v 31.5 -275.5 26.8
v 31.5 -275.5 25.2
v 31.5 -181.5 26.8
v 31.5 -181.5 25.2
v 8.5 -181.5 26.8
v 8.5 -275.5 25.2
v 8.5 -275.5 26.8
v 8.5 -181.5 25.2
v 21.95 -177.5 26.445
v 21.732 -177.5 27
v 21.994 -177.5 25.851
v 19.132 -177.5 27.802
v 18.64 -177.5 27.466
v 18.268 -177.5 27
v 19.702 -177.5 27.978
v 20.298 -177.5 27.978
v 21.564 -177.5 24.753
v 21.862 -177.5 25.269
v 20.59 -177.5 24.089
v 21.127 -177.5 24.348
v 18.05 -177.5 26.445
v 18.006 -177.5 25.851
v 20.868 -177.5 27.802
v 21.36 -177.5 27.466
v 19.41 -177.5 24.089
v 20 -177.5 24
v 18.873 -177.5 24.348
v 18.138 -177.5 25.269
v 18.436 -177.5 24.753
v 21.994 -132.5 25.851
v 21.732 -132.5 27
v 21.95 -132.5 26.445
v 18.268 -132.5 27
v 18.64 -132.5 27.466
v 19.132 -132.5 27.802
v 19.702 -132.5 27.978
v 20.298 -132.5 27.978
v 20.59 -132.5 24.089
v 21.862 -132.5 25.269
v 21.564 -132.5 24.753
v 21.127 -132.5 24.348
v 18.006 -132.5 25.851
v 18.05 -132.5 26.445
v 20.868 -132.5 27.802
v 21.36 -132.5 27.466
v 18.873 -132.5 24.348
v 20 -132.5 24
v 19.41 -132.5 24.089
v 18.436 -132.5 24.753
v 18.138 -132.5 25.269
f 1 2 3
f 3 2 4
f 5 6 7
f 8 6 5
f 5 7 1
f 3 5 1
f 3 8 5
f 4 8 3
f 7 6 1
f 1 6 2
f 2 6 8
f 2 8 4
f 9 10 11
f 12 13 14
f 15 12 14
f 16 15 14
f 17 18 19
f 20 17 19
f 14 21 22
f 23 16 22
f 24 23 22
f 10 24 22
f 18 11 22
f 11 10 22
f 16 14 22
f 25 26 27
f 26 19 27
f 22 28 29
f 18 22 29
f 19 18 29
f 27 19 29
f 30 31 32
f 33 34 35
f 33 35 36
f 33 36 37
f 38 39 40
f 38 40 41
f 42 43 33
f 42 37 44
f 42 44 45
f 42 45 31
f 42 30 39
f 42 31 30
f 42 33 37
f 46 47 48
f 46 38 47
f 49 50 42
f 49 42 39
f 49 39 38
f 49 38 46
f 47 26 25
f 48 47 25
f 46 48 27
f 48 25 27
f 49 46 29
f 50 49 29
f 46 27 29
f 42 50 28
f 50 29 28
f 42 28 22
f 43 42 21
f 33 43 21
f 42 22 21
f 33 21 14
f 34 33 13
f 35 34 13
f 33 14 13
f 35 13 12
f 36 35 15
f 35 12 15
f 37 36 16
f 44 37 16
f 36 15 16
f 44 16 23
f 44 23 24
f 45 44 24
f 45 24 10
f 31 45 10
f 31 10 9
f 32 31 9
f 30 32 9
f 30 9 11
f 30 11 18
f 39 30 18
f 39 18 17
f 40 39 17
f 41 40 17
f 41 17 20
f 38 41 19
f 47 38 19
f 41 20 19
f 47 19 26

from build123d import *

# Parameters (mm, degrees)
SKETCH1_W           = 23
SKETCH1_H           = 94
BOSS_EXTRUDE1_DEPTH = 1.6
SKETCH2_R           = 2
BOSS_EXTRUDE2_DEPTH = 45


with BuildPart() as part:
    # Sketch1 → Boss-Extrude1 (new body)
    with BuildSketch(Plane.XY.offset(25.2)):
        with Locations((20, -228.5)):
            Rectangle(SKETCH1_W, SKETCH1_H)
    extrude(amount=BOSS_EXTRUDE1_DEPTH)


with BuildPart() as body_2:
    # Sketch2 → Boss-Extrude2 (new body)
    with BuildSketch(Plane(origin=(0, -177.5, 0), x_dir=(1, 0, 0), z_dir=(0, 1, 0))):
        with Locations(Location((20, -26, 0), (0, 0, 90))):
            Circle(SKETCH2_R)
    extrude(amount=BOSS_EXTRUDE2_DEPTH)


solid = Compound([part.part, body_2.part])
